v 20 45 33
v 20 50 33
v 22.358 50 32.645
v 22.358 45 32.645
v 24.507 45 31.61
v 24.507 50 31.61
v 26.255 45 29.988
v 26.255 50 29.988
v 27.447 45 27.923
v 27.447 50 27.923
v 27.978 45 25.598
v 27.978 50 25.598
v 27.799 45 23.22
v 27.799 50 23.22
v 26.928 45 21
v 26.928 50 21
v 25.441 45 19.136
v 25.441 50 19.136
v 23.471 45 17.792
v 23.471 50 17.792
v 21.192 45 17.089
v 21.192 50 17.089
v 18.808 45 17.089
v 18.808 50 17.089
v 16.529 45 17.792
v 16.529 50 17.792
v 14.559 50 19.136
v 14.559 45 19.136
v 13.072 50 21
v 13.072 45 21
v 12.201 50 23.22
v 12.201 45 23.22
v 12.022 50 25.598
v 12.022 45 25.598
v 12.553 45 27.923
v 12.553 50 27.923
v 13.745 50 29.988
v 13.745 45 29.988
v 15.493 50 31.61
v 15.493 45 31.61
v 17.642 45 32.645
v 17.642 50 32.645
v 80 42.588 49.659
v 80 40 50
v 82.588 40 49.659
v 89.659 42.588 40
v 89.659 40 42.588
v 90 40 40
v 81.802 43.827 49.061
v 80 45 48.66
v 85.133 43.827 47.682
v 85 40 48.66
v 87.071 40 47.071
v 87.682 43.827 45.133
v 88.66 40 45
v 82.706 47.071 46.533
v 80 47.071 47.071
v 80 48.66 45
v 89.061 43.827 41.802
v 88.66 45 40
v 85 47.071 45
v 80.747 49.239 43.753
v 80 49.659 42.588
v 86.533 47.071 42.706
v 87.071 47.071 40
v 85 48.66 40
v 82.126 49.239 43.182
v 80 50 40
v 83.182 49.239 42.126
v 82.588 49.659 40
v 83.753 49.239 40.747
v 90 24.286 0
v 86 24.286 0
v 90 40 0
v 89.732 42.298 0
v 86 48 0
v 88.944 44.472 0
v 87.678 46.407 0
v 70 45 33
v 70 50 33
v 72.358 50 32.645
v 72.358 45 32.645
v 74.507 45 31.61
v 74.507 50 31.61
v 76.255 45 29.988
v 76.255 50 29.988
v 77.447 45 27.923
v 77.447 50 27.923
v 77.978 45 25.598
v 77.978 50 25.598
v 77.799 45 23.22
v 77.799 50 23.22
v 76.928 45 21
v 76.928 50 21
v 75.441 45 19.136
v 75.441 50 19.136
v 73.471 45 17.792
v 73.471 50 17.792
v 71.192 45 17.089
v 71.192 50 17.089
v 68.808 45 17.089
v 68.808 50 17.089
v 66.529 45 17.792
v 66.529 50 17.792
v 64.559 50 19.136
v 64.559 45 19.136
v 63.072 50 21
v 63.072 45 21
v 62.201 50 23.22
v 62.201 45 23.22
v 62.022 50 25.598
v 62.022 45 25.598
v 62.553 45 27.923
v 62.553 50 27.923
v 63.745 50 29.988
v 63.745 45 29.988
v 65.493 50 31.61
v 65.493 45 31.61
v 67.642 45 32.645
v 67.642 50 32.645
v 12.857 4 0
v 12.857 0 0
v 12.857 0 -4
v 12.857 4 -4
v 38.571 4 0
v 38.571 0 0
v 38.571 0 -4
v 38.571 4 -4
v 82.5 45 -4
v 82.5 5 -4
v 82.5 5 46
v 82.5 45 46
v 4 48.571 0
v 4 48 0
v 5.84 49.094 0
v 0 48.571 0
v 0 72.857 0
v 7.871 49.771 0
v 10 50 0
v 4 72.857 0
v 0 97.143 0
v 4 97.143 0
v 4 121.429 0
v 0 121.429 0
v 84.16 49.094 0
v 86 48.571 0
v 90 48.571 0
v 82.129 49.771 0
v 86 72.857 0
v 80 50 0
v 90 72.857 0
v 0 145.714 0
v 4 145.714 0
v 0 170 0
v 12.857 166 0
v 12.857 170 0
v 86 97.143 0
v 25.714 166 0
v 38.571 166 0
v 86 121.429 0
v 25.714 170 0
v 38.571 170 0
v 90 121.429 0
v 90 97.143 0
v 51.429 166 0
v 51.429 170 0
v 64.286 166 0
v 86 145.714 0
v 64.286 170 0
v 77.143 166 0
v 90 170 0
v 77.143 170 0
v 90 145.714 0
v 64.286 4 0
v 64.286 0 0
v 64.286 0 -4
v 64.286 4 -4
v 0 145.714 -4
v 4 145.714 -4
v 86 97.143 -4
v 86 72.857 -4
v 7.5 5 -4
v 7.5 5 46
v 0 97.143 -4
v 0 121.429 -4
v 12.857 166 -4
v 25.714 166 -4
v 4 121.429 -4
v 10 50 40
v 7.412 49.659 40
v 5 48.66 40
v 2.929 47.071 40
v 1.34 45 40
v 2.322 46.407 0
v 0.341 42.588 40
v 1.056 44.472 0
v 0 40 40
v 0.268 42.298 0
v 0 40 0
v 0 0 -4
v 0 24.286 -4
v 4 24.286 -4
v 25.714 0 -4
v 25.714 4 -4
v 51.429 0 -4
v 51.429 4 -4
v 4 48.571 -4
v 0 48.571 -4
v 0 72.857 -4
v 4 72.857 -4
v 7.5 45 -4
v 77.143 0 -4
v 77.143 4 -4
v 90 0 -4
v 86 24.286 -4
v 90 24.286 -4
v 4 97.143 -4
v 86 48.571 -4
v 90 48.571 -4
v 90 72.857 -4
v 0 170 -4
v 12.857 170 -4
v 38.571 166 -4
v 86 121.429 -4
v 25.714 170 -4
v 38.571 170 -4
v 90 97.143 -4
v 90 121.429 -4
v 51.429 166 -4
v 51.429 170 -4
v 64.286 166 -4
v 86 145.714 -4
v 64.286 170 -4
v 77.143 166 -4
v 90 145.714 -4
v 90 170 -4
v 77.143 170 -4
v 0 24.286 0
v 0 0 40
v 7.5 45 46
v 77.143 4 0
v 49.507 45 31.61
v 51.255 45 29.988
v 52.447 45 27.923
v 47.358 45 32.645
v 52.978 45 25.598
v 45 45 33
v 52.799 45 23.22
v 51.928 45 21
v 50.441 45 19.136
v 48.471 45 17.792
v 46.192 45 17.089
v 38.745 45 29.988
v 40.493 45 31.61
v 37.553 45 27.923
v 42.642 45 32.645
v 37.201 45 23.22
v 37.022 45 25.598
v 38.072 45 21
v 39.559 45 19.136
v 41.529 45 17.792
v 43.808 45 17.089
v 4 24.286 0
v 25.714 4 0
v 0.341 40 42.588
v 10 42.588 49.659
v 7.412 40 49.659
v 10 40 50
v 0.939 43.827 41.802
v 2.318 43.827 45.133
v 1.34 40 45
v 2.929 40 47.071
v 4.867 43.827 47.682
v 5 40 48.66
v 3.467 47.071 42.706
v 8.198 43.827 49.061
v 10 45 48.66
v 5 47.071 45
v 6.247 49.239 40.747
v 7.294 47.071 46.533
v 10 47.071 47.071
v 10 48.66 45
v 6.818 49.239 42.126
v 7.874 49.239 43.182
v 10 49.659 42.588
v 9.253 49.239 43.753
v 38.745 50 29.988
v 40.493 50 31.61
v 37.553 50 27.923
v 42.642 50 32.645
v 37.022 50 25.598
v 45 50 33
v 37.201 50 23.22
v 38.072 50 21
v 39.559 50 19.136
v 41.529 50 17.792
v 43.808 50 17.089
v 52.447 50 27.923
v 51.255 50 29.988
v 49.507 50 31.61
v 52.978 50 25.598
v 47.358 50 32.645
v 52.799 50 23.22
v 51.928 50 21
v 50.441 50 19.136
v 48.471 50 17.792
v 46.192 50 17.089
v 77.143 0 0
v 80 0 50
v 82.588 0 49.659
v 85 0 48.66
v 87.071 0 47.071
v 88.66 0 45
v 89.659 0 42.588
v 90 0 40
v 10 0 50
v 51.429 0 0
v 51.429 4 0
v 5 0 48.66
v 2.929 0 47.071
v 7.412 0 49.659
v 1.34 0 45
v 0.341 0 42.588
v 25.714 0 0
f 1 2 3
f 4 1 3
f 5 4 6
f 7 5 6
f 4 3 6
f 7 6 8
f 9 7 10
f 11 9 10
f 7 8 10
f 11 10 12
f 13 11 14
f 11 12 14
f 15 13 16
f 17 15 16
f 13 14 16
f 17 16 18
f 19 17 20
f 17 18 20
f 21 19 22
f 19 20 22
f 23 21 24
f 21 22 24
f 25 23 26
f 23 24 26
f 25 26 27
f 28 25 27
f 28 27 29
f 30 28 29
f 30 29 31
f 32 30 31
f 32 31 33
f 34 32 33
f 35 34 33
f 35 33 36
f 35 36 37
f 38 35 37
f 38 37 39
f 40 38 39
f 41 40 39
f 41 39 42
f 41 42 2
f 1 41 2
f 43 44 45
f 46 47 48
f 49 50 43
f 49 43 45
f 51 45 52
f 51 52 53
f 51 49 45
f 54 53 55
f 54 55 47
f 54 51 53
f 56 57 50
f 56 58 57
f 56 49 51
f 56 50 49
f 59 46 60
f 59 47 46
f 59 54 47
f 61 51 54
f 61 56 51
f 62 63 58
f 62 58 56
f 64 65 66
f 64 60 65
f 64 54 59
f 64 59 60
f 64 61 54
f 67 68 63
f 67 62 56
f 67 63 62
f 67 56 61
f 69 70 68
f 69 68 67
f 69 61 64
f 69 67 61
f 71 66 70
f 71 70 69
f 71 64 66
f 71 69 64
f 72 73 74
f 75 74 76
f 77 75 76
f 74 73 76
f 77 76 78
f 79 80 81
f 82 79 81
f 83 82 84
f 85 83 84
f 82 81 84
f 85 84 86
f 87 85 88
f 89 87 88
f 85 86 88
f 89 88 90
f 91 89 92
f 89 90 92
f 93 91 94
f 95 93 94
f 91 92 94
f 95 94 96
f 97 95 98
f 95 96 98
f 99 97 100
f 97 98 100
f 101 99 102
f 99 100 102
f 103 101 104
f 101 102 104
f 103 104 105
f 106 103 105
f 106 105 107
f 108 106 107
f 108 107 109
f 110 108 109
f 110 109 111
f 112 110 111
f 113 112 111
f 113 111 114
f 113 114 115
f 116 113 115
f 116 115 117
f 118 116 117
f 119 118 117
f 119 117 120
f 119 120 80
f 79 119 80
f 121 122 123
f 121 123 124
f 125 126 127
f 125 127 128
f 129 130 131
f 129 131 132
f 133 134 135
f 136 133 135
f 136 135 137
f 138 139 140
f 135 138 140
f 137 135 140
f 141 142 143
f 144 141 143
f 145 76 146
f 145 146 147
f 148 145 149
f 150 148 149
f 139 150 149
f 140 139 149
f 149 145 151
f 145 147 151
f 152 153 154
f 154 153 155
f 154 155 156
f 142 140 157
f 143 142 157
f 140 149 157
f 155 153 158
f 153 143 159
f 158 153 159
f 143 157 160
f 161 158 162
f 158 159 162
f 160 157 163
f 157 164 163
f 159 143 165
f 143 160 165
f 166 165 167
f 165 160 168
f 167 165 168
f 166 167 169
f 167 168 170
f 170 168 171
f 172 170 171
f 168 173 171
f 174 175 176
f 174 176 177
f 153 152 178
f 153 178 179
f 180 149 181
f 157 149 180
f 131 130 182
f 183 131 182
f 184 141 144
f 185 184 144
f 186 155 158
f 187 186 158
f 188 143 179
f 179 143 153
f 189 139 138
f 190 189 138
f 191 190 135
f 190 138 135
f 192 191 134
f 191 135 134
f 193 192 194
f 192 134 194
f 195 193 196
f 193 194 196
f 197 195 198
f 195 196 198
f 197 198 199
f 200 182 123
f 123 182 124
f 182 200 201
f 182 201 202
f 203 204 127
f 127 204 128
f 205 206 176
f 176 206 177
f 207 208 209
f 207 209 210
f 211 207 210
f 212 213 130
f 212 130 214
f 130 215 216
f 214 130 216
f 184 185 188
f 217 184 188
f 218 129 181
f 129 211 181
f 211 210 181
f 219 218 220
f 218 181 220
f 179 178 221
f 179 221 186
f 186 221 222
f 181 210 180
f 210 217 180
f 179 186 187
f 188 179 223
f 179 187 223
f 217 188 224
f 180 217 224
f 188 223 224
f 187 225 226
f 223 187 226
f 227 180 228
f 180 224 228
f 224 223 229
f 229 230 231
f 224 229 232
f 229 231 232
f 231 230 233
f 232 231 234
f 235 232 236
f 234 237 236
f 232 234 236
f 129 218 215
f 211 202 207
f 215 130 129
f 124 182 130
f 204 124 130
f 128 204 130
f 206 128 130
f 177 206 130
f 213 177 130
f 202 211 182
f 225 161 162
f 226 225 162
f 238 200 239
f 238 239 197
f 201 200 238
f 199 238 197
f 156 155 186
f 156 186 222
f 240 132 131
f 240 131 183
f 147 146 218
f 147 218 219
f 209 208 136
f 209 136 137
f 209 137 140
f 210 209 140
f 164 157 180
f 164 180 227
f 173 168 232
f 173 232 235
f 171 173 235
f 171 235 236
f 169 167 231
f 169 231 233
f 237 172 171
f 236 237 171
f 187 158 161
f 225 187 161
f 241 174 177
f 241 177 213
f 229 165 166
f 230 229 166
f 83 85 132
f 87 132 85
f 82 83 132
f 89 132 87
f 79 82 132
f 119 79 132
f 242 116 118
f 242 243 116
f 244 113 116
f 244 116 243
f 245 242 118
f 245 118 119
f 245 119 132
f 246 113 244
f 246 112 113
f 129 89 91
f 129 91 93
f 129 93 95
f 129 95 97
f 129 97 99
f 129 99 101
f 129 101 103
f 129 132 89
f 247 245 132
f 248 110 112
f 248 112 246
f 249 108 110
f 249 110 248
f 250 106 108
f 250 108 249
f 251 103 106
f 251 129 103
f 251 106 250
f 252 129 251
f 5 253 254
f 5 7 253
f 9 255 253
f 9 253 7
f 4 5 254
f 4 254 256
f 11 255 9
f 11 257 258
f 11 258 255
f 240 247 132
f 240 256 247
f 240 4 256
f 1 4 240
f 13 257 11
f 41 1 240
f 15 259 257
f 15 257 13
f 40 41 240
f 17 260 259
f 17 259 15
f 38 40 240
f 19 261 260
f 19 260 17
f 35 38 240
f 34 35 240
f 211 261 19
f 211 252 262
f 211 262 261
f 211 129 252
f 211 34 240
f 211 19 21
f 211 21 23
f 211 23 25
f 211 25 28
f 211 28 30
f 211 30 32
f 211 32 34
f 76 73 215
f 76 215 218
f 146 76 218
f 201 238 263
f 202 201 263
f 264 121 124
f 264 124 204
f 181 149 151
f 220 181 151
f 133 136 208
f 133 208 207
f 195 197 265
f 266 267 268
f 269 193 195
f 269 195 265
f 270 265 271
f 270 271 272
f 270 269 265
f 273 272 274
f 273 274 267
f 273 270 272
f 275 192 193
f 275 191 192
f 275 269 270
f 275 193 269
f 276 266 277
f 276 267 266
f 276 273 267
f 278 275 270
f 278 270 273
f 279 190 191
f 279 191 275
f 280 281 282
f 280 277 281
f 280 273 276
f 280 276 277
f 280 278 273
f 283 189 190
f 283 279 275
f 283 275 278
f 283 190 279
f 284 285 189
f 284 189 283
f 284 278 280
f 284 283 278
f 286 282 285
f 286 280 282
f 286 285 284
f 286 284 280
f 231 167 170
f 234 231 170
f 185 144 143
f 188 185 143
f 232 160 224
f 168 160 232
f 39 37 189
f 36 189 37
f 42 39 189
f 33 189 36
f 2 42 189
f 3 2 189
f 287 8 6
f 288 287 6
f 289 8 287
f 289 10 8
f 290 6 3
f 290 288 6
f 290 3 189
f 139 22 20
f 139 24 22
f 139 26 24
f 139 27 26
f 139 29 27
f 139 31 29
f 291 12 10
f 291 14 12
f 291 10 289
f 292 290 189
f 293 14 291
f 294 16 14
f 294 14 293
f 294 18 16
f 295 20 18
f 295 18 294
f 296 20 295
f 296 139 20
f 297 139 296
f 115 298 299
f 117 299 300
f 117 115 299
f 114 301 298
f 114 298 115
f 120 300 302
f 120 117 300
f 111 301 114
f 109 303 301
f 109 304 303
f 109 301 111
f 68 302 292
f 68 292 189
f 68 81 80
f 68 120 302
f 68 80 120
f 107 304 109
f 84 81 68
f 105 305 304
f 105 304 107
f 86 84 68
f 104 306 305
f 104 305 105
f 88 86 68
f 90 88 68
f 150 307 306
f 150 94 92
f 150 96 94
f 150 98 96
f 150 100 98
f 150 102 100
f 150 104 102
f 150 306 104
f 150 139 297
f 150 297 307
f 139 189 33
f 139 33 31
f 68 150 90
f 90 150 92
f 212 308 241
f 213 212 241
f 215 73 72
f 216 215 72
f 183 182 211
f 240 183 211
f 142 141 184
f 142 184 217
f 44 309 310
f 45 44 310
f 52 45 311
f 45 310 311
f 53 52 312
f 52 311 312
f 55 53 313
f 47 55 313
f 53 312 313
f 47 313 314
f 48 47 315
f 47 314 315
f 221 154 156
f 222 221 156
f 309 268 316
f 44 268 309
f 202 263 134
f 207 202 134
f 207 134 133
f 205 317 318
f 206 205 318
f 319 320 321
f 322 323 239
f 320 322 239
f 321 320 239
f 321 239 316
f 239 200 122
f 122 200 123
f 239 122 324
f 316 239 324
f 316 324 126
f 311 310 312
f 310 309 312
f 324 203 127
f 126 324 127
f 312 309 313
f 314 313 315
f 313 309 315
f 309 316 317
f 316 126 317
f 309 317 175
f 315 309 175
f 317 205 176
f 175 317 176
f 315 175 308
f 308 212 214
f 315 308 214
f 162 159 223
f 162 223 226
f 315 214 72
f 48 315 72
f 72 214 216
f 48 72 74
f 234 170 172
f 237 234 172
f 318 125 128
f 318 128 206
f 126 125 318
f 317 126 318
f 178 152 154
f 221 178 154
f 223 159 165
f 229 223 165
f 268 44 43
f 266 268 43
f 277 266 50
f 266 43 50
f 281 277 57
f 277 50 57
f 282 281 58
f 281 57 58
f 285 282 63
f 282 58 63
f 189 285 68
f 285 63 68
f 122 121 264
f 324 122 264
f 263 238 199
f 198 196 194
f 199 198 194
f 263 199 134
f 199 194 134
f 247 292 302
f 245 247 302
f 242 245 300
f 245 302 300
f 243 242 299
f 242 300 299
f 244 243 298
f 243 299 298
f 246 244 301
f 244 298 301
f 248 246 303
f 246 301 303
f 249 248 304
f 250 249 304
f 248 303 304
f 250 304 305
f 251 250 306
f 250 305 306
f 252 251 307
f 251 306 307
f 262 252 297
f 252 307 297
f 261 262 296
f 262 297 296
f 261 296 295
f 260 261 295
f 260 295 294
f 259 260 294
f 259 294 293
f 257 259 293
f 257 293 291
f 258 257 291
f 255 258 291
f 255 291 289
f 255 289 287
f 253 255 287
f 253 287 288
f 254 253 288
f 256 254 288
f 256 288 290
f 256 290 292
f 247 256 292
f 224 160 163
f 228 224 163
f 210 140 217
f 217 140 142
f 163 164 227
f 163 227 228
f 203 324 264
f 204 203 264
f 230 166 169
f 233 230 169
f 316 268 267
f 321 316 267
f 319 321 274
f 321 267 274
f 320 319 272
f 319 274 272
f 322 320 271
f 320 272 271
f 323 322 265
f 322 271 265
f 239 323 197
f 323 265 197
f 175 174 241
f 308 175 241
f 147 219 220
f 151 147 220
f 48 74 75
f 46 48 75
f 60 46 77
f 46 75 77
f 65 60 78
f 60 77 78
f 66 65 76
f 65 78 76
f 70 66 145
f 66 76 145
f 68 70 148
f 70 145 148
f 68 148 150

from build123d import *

# Parameters (mm, degrees)
BUITENAFMETING_RECHTHOEK_W  = 90
BUITENAFMETING_RECHTHOEK_H  = 170
PLAAT_DEPTH                 = 4
TAND_HOR_W                  = 12.857142857
TAND_HOR_H                  = 4
TAND_BOVEN_DEPTH            = 193.395426141
TANDEN_PATROON_BOVEN_COUNT  = 3
TANDEN_PATROON_BOVEN_PITCH  = 25.714285714
TAND_VER_W                  = 4
TAND_VER_H                  = 24.285714285
TAND_LINKS_DEPTH            = 193.395426141
TANDEN_PATROON_LINKS_COUNT  = 3
TANDEN_PATROON_LINKS_PITCH  = 48.571428571
TAND_O_W                    = 12.857142857
TAND_O_H                    = 4
TAND_ONDER_DEPTH            = 193.395426141
TANDEN_PATROON_ONDER_COUNT  = 3
TANDEN_PATROON_ONDER_PITCH  = 25.714285714
TAND_R_W                    = 4
TAND_R_H                    = 24.285714285
TAND_RECHTS_DEPTH           = 193.395426141
TANDEN_PATROON_RECHTS_COUNT = 3
TANDEN_PATROON_RECHTS_PITCH = 48.571428571
SKETCH1_W                   = 90
SKETCH1_H                   = 50
BOSS_EXTRUDE1_DEPTH         = 50
SKETCH2_W                   = 75
SKETCH2_H                   = 40
CUT_EXTRUDE1_DEPTH          = 50
SKETCH3_R                   = 8
CUT_EXTRUDE3_DEPTH          = 24
FILLET1_R                   = 10


with BuildPart() as part:
    # Buitenafmeting Rechthoek → Plaat (new body)
    with BuildSketch(Plane.XY):
        with Locations((45, 85)):
            Rectangle(BUITENAFMETING_RECHTHOEK_W, BUITENAFMETING_RECHTHOEK_H)
    extrude(amount=-PLAAT_DEPTH)

    # Tand Hor → Tand Boven (cut, through all)
    with BuildSketch(Plane.XY):
        with Locations((19.285714286, 168)):
            Rectangle(TAND_HOR_W, TAND_HOR_H)
    tand_boven = extrude(amount=-TAND_BOVEN_DEPTH, mode=Mode.SUBTRACT)

    # Tanden Patroon Boven: Tand Boven ×3
    with Locations(*[(i * TANDEN_PATROON_BOVEN_PITCH, 0, 0) for i in range(1, TANDEN_PATROON_BOVEN_COUNT)]):
        add(tand_boven, mode=Mode.SUBTRACT)

    # Tand Ver → Tand Links (cut, through all)
    with BuildSketch(Plane.XY):
        with Locations((2, 133.571428572)):
            Rectangle(TAND_VER_W, TAND_VER_H)
    tand_links = extrude(amount=-TAND_LINKS_DEPTH, mode=Mode.SUBTRACT)

    # Tanden Patroon Links: Tand Links ×3
    with Locations(*[(0, -i * TANDEN_PATROON_LINKS_PITCH, 0) for i in range(1, TANDEN_PATROON_LINKS_COUNT)]):
        add(tand_links, mode=Mode.SUBTRACT)

    # Tand O → Tand Onder (cut, through all)
    with BuildSketch(Plane.XY):
        with Locations((19.285714286, 2)):
            Rectangle(TAND_O_W, TAND_O_H)
    tand_onder = extrude(amount=-TAND_ONDER_DEPTH, mode=Mode.SUBTRACT)

    # Tanden Patroon Onder: Tand Onder ×3
    with Locations(*[(i * TANDEN_PATROON_ONDER_PITCH, 0, 0) for i in range(1, TANDEN_PATROON_ONDER_COUNT)]):
        add(tand_onder, mode=Mode.SUBTRACT)

    # Tand R → Tand Rechts (cut, through all)
    with BuildSketch(Plane.XY):
        with Locations((88, 133.571428572)):
            Rectangle(TAND_R_W, TAND_R_H)
    tand_rechts = extrude(amount=-TAND_RECHTS_DEPTH, mode=Mode.SUBTRACT)

    # Tanden Patroon Rechts: Tand Rechts ×3
    with Locations(*[(0, -i * TANDEN_PATROON_RECHTS_PITCH, 0) for i in range(1, TANDEN_PATROON_RECHTS_COUNT)]):
        add(tand_rechts, mode=Mode.SUBTRACT)

    # Sketch1 → Boss-Extrude1 (add)
    with BuildSketch(Plane.XY):
        with Locations((45, 25)):
            Rectangle(SKETCH1_W, SKETCH1_H)
    extrude(amount=BOSS_EXTRUDE1_DEPTH)

    # Sketch2 → Cut-Extrude1 (cut)
    with BuildSketch(Plane(origin=(0, 0, -4), x_dir=(-1, 0, 0), z_dir=(0, 0, -1))):
        with Locations((-45, 25)):
            Rectangle(SKETCH2_W, SKETCH2_H)
    extrude(amount=-CUT_EXTRUDE1_DEPTH, mode=Mode.SUBTRACT)

    # Sketch3 → Cut-Extrude3 (cut)
    with BuildSketch(Plane(origin=(0, 50, 0), x_dir=(1, 0, 0), z_dir=(0, 1, 0))):
        with Locations(Location((45, -25, 0), (0, 0, 270))):
            Circle(SKETCH3_R)
        with Locations(Location((70, -25, 0), (0, 0, 270))):
            Circle(SKETCH3_R)
        with Locations(Location((20, -25, 0), (0, 0, 270))):
            Circle(SKETCH3_R)
    extrude(amount=-CUT_EXTRUDE3_DEPTH, mode=Mode.SUBTRACT)

    # Fillet1
    # the kernel refuses this fillet: 10 mm, written as the material it takes off along each edge
    with BuildSketch(Plane(origin=(10, 40, 40), x_dir=(0, 0, 1), z_dir=(0, 1, 0))) as fillet1_piece_1_section:
        Polygon((0, 0), (FILLET1_R * 1.02, 0), (FILLET1_R * 1.02, -FILLET1_R * 1.02), (0, -FILLET1_R * 1.02), align=None)
    fillet1_piece_1 = extrude(amount=FILLET1_R * 1.02, mode=Mode.PRIVATE)
    fillet1_piece_1 = fillet1_piece_1 - Plane(origin=(10, 40, 40), x_dir=(0.7071067811865475, 0, -0.7071067811865475), z_dir=(0, 1, 0)) * Sphere(FILLET1_R, mode=Mode.PRIVATE)
    add(fillet1_piece_1, mode=Mode.SUBTRACT)
    with BuildSketch(Plane(origin=(80, 40, 40), x_dir=(1, 0, 0), z_dir=(0, 1, 0))) as fillet1_piece_2_section:
        Polygon((0, 0), (FILLET1_R * 1.02, 0), (FILLET1_R * 1.02, -FILLET1_R * 1.02), (0, -FILLET1_R * 1.02), align=None)
    fillet1_piece_2 = extrude(amount=FILLET1_R * 1.02, mode=Mode.PRIVATE)
    fillet1_piece_2 = fillet1_piece_2 - Plane(origin=(80, 40, 40), x_dir=(-0.7071067811865475, 0, -0.7071067811865475), z_dir=(0, 1, 0)) * Sphere(FILLET1_R, mode=Mode.PRIVATE)
    add(fillet1_piece_2, mode=Mode.SUBTRACT)
    with BuildSketch(Plane(origin=(0, 50, 0), x_dir=(0, -1, 0), z_dir=(0, 0, 1))) as fillet1_piece_3:
        with BuildLine():
            CenterArc((FILLET1_R, FILLET1_R), FILLET1_R, 180, 90)
            Line((0, FILLET1_R), (0, 0))
            Line((0, 0), (FILLET1_R, 0))
        make_face()
    extrude(amount=40, mode=Mode.SUBTRACT)
    with BuildSketch(Plane(origin=(90, 50, 0), x_dir=(0, -1, 0), z_dir=(0, 0, 1))) as fillet1_piece_4:
        with BuildLine():
            CenterArc((FILLET1_R, -FILLET1_R), FILLET1_R, 90, 90)
            Line((0, -FILLET1_R), (0, 0))
            Line((0, 0), (FILLET1_R, 0))
        make_face()
    extrude(amount=40, mode=Mode.SUBTRACT)
    with BuildSketch(Plane(origin=(0, 40, 50), x_dir=(1, 0, 0), z_dir=(0, -1, 0))) as fillet1_piece_5:
        with BuildLine():
            CenterArc((FILLET1_R, -FILLET1_R), FILLET1_R, 90, 90)
            Line((0, -FILLET1_R), (0, 0))
            Line((0, 0), (FILLET1_R, 0))
        make_face()
    extrude(amount=65, mode=Mode.SUBTRACT)
    with BuildSketch(Plane(origin=(90, -25, 50), x_dir=(0, 0, -1), z_dir=(0, 1, 0))) as fillet1_piece_6:
        with BuildLine():
            CenterArc((FILLET1_R, FILLET1_R), FILLET1_R, 180, 90)
            Line((0, FILLET1_R), (0, 0))
            Line((0, 0), (FILLET1_R, 0))
        make_face()
    extrude(amount=65, mode=Mode.SUBTRACT)
    with BuildSketch(Plane(origin=(80, 50, 50), x_dir=(0, -1, 0), z_dir=(-1, 0, 0))) as fillet1_piece_7:
        with BuildLine():
            CenterArc((FILLET1_R, -FILLET1_R), FILLET1_R, 90, 90)
            Line((0, -FILLET1_R), (0, 0))
            Line((0, 0), (FILLET1_R, 0))
        make_face()
    extrude(amount=70, mode=Mode.SUBTRACT)


solid = part.part
